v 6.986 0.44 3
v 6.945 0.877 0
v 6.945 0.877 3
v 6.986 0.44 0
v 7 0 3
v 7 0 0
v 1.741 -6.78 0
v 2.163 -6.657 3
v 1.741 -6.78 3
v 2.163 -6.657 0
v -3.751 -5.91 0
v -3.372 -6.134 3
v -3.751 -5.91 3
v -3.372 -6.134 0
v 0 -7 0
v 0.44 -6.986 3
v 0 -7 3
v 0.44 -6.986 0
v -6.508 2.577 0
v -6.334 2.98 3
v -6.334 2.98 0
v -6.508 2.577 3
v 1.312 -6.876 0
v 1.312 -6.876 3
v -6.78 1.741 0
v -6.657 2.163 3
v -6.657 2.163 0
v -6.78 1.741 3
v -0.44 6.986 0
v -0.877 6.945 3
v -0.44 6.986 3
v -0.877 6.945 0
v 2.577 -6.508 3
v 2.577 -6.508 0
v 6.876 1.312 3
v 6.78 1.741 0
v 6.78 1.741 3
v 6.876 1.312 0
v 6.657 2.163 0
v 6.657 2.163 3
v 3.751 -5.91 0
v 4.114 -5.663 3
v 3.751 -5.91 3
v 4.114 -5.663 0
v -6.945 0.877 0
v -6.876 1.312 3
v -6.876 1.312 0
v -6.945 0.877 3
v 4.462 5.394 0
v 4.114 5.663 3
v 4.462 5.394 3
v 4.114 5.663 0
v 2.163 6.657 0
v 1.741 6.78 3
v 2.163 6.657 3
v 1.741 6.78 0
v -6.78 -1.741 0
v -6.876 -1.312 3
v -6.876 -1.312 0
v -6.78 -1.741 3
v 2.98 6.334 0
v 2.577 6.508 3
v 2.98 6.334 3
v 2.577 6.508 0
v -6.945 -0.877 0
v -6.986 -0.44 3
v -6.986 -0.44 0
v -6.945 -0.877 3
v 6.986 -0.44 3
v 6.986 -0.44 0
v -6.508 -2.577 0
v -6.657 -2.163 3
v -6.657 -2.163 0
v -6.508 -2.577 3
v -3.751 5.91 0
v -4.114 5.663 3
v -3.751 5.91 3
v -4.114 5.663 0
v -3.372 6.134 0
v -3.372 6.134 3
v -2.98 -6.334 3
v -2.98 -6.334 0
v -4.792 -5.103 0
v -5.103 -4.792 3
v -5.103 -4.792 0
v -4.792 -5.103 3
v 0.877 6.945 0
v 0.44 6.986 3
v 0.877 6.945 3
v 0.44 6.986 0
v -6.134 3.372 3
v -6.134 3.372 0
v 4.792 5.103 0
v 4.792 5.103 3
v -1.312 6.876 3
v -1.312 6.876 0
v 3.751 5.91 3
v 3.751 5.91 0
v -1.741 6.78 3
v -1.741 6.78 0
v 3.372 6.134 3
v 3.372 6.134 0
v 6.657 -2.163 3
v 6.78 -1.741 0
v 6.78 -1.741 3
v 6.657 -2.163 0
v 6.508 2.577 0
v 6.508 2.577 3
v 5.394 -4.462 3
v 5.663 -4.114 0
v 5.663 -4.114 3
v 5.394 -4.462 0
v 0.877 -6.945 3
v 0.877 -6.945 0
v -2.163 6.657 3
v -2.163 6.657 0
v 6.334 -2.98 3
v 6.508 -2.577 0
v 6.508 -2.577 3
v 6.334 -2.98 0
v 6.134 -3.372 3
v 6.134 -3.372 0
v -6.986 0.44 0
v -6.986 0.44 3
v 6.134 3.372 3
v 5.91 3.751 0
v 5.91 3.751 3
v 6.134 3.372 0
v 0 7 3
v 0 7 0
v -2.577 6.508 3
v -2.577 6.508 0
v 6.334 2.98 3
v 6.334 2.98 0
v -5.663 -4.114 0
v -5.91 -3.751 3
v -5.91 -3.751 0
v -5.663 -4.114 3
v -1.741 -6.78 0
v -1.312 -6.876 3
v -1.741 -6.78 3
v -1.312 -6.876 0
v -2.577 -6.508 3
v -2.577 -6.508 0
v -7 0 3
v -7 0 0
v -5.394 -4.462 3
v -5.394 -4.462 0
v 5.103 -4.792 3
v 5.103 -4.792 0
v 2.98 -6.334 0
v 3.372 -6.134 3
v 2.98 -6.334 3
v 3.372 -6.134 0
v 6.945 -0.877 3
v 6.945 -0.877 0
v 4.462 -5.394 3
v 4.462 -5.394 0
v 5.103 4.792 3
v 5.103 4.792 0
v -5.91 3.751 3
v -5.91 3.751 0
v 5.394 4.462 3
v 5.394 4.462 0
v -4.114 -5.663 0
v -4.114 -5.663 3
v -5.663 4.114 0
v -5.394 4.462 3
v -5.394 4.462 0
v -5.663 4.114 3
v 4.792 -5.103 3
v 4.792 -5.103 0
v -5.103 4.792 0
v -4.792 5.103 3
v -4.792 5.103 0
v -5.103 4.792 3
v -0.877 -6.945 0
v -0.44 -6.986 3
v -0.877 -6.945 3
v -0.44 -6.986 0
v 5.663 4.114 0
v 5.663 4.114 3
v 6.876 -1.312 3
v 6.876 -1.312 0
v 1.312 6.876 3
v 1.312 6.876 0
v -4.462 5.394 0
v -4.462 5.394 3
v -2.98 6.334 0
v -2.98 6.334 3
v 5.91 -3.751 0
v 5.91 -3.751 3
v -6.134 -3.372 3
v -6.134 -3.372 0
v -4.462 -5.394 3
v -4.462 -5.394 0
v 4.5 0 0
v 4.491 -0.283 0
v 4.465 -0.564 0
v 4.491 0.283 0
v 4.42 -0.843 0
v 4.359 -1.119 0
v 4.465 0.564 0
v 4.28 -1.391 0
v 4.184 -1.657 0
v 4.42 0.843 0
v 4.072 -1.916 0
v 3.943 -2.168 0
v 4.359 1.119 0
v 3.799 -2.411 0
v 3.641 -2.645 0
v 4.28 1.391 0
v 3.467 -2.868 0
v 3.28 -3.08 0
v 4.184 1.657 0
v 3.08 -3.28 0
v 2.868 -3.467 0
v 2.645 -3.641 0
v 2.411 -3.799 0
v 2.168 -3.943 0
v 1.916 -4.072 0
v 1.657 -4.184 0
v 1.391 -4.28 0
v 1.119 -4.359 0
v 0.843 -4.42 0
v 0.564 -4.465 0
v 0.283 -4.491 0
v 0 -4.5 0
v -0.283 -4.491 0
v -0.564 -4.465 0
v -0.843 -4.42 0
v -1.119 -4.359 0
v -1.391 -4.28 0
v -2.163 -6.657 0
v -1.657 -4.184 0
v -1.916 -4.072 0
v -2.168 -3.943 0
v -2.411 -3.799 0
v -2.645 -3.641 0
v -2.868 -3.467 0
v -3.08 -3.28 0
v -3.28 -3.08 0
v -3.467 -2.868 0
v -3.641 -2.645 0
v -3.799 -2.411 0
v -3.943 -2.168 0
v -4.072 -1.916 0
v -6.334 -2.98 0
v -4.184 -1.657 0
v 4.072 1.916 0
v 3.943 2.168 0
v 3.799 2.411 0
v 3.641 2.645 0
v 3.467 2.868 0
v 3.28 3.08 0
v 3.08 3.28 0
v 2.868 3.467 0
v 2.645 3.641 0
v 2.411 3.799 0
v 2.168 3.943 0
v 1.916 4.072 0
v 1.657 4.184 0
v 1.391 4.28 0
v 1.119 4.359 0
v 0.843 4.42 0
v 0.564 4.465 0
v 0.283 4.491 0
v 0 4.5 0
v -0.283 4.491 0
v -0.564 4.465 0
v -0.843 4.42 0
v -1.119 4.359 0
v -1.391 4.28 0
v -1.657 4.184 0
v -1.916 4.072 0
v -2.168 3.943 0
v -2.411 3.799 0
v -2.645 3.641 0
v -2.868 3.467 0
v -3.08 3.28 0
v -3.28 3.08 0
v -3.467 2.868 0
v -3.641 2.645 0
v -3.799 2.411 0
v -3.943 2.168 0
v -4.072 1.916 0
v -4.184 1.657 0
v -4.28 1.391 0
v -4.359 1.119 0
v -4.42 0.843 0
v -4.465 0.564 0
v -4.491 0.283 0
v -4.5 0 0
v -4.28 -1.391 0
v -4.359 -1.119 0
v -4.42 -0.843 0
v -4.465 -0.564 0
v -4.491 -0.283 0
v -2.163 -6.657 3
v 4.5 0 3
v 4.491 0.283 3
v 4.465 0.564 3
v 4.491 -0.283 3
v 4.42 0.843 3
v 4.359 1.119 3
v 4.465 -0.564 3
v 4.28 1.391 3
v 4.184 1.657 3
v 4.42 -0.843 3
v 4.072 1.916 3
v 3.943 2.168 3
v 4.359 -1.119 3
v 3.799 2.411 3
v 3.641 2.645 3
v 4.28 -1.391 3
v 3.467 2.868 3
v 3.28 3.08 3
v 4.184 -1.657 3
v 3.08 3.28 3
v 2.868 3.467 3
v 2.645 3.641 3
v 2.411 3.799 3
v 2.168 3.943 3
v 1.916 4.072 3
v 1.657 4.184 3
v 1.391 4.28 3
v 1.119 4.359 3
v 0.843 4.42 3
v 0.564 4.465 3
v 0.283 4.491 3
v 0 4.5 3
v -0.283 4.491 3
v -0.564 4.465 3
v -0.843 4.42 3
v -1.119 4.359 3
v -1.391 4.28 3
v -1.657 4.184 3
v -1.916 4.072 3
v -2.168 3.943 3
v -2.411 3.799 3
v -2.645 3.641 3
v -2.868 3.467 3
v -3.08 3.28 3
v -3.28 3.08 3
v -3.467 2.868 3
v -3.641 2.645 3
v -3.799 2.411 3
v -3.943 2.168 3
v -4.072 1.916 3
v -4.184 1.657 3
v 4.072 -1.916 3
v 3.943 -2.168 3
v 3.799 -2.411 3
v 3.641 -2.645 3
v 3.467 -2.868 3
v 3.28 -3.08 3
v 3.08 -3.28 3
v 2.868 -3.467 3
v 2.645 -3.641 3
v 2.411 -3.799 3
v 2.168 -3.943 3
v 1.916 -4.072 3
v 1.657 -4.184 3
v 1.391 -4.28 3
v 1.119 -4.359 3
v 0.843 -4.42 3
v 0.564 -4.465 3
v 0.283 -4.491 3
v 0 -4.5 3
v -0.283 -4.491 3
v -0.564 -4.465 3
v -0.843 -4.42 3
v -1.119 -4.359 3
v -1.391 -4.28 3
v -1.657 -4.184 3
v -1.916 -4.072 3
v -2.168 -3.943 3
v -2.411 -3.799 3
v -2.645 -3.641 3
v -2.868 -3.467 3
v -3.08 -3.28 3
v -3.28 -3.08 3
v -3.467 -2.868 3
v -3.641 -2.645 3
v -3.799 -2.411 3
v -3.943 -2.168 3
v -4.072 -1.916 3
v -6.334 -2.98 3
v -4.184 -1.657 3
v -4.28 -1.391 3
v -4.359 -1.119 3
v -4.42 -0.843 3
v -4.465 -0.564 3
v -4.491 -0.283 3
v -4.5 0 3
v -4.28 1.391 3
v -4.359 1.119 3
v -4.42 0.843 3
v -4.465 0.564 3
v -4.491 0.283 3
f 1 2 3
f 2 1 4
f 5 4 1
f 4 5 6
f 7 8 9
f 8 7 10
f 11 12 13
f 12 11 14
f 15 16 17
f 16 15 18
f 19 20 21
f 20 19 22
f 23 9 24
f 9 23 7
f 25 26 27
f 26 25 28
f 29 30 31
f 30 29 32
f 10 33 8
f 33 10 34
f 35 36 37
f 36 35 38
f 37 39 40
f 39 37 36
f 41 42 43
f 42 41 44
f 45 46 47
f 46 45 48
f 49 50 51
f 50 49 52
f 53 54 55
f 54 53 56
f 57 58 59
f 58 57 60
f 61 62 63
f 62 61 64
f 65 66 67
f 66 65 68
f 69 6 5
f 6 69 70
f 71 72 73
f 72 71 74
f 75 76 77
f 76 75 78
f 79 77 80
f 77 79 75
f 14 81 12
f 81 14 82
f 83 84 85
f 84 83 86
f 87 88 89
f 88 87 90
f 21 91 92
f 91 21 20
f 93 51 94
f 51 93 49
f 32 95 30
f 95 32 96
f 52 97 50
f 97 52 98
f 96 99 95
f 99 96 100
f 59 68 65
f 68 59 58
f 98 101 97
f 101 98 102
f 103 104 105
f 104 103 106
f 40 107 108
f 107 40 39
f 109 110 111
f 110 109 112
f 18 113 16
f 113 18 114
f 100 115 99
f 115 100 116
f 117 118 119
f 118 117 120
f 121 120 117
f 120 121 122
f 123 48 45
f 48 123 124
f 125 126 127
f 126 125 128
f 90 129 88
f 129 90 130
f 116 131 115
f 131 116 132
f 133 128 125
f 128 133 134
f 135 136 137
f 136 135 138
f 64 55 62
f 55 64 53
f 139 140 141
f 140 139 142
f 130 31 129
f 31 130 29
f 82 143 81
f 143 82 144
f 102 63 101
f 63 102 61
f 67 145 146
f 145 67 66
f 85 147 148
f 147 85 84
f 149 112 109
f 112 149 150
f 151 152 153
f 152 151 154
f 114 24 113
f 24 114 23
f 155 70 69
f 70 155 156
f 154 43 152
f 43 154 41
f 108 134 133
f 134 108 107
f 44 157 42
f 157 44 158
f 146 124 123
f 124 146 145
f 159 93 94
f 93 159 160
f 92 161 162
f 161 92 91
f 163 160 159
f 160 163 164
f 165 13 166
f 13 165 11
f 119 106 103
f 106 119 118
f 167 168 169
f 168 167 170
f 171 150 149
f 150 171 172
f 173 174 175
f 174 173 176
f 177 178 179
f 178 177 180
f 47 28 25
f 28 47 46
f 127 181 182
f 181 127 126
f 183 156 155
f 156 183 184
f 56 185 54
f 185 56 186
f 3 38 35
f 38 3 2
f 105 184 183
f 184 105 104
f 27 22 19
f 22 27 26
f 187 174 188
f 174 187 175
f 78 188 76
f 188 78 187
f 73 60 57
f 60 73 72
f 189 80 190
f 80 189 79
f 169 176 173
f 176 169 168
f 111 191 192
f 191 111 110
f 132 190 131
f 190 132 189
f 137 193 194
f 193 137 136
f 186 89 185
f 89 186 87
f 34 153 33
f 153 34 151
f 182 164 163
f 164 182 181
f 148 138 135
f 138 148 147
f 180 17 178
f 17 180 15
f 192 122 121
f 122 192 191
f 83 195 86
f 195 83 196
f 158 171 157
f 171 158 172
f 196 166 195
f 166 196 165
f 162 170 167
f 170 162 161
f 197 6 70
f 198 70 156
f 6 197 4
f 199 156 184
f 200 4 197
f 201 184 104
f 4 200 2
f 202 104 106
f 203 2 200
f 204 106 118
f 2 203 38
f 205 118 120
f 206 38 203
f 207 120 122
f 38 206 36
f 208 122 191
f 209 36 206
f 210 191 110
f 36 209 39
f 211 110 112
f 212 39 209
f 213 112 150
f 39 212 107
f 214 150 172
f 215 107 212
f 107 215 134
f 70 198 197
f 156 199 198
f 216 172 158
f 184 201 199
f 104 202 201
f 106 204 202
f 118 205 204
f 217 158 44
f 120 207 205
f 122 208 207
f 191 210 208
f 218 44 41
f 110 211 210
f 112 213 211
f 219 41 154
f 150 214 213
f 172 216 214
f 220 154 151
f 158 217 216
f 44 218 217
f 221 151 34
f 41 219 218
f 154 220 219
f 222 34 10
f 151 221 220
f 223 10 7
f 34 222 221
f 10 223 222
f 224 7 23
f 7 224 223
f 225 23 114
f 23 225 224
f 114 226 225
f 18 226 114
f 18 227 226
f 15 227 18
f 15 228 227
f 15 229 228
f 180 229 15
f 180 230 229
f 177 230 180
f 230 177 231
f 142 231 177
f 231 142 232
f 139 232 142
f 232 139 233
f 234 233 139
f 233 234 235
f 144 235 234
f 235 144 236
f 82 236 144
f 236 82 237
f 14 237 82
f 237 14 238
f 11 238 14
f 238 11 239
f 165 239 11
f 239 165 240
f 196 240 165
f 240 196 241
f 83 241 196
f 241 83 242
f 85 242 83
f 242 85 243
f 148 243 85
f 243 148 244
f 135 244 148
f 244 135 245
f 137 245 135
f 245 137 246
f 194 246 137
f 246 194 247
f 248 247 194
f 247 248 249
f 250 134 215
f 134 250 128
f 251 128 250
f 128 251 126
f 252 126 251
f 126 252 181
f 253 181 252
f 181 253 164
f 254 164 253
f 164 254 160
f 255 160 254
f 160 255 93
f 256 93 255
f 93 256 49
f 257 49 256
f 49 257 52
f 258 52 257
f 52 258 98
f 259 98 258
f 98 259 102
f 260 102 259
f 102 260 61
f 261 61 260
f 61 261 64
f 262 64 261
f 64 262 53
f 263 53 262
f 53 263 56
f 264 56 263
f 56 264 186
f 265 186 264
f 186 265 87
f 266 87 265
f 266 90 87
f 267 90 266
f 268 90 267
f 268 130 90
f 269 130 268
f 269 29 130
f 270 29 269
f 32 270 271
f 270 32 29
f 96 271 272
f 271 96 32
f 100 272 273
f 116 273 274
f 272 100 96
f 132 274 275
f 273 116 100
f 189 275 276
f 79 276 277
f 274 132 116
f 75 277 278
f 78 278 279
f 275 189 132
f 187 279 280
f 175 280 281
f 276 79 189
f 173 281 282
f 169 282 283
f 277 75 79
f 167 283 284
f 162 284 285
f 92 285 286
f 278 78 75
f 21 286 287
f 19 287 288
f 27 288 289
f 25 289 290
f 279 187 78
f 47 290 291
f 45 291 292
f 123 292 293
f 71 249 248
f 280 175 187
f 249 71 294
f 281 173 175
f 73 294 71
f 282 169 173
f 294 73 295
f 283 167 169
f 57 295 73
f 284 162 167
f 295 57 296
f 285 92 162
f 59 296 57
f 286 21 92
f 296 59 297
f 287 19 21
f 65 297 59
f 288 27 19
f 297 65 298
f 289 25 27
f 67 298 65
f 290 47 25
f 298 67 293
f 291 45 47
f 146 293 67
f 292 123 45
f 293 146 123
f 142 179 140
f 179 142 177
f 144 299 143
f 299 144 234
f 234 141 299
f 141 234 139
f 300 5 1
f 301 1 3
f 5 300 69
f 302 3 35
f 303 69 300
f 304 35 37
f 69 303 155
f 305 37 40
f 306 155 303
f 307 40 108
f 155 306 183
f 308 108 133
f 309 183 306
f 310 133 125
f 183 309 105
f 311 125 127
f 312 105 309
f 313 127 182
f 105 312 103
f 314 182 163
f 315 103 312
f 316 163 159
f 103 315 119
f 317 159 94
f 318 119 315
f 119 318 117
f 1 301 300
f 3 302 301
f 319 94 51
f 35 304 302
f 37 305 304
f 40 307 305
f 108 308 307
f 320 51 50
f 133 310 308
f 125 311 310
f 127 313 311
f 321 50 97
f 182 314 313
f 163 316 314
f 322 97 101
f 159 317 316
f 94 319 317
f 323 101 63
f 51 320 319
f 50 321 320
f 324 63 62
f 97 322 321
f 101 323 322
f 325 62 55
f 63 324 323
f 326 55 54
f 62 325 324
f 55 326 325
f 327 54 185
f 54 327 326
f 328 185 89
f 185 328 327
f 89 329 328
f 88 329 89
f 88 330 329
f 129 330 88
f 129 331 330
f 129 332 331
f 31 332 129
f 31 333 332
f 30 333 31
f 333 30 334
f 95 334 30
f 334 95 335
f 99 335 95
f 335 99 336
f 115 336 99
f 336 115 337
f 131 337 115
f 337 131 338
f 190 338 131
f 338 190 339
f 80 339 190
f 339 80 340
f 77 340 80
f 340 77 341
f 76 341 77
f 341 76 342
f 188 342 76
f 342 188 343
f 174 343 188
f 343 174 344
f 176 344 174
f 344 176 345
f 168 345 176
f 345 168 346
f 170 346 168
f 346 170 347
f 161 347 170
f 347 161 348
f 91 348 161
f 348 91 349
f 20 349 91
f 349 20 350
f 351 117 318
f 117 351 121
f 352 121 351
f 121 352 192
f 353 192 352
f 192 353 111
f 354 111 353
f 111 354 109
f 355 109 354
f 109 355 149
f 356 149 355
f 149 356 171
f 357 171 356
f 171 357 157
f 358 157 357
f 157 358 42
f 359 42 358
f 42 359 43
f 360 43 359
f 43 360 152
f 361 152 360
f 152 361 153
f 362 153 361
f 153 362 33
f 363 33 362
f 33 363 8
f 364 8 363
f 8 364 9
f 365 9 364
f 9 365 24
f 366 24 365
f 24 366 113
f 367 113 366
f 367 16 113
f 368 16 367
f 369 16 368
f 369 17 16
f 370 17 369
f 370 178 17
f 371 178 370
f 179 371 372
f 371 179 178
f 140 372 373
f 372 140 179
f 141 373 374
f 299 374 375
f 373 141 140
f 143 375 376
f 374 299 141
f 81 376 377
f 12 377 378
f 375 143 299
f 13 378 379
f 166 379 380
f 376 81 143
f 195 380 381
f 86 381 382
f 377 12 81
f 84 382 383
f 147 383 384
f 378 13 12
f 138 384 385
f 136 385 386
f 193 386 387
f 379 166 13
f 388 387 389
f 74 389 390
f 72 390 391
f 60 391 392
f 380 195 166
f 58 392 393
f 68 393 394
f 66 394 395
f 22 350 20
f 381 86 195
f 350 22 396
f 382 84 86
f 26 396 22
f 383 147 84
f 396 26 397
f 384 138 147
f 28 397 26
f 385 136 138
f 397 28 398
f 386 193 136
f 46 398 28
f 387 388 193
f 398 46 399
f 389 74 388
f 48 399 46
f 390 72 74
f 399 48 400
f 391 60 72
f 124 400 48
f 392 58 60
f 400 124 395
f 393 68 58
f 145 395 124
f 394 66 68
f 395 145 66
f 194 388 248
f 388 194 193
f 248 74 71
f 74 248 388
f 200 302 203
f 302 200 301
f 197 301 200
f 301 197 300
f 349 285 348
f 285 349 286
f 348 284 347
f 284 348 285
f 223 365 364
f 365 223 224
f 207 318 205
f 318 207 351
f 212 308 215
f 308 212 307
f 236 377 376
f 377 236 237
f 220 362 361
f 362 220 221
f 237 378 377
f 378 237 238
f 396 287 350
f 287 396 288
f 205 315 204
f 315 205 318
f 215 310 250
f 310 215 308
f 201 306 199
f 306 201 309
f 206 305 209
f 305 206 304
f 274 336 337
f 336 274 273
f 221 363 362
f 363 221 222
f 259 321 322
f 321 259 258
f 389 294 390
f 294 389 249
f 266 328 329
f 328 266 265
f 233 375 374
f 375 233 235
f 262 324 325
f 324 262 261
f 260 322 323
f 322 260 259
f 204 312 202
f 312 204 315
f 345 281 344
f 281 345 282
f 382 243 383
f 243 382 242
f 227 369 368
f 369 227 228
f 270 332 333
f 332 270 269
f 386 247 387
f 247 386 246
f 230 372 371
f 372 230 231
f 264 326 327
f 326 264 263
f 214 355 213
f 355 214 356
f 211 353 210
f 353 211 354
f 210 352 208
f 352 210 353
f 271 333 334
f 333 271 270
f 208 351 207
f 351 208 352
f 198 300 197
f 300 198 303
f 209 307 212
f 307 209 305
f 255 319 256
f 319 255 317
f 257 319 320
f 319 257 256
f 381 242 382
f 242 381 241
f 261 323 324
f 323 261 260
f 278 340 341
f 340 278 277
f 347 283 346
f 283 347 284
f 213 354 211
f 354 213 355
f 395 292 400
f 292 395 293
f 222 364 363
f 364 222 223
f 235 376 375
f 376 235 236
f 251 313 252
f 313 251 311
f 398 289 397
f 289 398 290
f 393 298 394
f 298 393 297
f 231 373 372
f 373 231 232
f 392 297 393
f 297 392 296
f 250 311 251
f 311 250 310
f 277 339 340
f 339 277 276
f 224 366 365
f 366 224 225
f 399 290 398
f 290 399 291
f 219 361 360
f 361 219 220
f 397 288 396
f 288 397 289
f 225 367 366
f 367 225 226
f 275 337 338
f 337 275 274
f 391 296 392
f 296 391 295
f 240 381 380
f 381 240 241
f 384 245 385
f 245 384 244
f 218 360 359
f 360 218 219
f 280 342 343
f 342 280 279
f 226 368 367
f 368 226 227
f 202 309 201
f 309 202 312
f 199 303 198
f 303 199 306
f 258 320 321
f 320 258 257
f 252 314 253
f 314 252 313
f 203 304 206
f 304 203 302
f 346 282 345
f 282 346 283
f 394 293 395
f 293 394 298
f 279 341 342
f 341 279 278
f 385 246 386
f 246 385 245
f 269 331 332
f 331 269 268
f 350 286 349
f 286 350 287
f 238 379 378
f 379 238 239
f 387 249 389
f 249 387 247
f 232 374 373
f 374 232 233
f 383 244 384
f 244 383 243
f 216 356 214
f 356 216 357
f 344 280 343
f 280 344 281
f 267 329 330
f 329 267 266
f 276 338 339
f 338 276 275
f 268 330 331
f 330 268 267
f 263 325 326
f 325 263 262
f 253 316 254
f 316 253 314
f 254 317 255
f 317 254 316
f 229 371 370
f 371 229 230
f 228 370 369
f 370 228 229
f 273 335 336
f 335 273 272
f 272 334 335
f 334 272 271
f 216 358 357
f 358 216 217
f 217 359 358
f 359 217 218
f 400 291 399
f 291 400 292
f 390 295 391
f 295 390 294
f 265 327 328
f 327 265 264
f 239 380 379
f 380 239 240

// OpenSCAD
$fn = 100;

ornamentLoop();

module ornamentLoop(height = 3)
{    
    difference()
    {
        cylinder(r=7, h=height);
        
        radius = 4.5;
        translate([0, 0, -1])
        cylinder(r=radius, h=height+2);
    }
}
